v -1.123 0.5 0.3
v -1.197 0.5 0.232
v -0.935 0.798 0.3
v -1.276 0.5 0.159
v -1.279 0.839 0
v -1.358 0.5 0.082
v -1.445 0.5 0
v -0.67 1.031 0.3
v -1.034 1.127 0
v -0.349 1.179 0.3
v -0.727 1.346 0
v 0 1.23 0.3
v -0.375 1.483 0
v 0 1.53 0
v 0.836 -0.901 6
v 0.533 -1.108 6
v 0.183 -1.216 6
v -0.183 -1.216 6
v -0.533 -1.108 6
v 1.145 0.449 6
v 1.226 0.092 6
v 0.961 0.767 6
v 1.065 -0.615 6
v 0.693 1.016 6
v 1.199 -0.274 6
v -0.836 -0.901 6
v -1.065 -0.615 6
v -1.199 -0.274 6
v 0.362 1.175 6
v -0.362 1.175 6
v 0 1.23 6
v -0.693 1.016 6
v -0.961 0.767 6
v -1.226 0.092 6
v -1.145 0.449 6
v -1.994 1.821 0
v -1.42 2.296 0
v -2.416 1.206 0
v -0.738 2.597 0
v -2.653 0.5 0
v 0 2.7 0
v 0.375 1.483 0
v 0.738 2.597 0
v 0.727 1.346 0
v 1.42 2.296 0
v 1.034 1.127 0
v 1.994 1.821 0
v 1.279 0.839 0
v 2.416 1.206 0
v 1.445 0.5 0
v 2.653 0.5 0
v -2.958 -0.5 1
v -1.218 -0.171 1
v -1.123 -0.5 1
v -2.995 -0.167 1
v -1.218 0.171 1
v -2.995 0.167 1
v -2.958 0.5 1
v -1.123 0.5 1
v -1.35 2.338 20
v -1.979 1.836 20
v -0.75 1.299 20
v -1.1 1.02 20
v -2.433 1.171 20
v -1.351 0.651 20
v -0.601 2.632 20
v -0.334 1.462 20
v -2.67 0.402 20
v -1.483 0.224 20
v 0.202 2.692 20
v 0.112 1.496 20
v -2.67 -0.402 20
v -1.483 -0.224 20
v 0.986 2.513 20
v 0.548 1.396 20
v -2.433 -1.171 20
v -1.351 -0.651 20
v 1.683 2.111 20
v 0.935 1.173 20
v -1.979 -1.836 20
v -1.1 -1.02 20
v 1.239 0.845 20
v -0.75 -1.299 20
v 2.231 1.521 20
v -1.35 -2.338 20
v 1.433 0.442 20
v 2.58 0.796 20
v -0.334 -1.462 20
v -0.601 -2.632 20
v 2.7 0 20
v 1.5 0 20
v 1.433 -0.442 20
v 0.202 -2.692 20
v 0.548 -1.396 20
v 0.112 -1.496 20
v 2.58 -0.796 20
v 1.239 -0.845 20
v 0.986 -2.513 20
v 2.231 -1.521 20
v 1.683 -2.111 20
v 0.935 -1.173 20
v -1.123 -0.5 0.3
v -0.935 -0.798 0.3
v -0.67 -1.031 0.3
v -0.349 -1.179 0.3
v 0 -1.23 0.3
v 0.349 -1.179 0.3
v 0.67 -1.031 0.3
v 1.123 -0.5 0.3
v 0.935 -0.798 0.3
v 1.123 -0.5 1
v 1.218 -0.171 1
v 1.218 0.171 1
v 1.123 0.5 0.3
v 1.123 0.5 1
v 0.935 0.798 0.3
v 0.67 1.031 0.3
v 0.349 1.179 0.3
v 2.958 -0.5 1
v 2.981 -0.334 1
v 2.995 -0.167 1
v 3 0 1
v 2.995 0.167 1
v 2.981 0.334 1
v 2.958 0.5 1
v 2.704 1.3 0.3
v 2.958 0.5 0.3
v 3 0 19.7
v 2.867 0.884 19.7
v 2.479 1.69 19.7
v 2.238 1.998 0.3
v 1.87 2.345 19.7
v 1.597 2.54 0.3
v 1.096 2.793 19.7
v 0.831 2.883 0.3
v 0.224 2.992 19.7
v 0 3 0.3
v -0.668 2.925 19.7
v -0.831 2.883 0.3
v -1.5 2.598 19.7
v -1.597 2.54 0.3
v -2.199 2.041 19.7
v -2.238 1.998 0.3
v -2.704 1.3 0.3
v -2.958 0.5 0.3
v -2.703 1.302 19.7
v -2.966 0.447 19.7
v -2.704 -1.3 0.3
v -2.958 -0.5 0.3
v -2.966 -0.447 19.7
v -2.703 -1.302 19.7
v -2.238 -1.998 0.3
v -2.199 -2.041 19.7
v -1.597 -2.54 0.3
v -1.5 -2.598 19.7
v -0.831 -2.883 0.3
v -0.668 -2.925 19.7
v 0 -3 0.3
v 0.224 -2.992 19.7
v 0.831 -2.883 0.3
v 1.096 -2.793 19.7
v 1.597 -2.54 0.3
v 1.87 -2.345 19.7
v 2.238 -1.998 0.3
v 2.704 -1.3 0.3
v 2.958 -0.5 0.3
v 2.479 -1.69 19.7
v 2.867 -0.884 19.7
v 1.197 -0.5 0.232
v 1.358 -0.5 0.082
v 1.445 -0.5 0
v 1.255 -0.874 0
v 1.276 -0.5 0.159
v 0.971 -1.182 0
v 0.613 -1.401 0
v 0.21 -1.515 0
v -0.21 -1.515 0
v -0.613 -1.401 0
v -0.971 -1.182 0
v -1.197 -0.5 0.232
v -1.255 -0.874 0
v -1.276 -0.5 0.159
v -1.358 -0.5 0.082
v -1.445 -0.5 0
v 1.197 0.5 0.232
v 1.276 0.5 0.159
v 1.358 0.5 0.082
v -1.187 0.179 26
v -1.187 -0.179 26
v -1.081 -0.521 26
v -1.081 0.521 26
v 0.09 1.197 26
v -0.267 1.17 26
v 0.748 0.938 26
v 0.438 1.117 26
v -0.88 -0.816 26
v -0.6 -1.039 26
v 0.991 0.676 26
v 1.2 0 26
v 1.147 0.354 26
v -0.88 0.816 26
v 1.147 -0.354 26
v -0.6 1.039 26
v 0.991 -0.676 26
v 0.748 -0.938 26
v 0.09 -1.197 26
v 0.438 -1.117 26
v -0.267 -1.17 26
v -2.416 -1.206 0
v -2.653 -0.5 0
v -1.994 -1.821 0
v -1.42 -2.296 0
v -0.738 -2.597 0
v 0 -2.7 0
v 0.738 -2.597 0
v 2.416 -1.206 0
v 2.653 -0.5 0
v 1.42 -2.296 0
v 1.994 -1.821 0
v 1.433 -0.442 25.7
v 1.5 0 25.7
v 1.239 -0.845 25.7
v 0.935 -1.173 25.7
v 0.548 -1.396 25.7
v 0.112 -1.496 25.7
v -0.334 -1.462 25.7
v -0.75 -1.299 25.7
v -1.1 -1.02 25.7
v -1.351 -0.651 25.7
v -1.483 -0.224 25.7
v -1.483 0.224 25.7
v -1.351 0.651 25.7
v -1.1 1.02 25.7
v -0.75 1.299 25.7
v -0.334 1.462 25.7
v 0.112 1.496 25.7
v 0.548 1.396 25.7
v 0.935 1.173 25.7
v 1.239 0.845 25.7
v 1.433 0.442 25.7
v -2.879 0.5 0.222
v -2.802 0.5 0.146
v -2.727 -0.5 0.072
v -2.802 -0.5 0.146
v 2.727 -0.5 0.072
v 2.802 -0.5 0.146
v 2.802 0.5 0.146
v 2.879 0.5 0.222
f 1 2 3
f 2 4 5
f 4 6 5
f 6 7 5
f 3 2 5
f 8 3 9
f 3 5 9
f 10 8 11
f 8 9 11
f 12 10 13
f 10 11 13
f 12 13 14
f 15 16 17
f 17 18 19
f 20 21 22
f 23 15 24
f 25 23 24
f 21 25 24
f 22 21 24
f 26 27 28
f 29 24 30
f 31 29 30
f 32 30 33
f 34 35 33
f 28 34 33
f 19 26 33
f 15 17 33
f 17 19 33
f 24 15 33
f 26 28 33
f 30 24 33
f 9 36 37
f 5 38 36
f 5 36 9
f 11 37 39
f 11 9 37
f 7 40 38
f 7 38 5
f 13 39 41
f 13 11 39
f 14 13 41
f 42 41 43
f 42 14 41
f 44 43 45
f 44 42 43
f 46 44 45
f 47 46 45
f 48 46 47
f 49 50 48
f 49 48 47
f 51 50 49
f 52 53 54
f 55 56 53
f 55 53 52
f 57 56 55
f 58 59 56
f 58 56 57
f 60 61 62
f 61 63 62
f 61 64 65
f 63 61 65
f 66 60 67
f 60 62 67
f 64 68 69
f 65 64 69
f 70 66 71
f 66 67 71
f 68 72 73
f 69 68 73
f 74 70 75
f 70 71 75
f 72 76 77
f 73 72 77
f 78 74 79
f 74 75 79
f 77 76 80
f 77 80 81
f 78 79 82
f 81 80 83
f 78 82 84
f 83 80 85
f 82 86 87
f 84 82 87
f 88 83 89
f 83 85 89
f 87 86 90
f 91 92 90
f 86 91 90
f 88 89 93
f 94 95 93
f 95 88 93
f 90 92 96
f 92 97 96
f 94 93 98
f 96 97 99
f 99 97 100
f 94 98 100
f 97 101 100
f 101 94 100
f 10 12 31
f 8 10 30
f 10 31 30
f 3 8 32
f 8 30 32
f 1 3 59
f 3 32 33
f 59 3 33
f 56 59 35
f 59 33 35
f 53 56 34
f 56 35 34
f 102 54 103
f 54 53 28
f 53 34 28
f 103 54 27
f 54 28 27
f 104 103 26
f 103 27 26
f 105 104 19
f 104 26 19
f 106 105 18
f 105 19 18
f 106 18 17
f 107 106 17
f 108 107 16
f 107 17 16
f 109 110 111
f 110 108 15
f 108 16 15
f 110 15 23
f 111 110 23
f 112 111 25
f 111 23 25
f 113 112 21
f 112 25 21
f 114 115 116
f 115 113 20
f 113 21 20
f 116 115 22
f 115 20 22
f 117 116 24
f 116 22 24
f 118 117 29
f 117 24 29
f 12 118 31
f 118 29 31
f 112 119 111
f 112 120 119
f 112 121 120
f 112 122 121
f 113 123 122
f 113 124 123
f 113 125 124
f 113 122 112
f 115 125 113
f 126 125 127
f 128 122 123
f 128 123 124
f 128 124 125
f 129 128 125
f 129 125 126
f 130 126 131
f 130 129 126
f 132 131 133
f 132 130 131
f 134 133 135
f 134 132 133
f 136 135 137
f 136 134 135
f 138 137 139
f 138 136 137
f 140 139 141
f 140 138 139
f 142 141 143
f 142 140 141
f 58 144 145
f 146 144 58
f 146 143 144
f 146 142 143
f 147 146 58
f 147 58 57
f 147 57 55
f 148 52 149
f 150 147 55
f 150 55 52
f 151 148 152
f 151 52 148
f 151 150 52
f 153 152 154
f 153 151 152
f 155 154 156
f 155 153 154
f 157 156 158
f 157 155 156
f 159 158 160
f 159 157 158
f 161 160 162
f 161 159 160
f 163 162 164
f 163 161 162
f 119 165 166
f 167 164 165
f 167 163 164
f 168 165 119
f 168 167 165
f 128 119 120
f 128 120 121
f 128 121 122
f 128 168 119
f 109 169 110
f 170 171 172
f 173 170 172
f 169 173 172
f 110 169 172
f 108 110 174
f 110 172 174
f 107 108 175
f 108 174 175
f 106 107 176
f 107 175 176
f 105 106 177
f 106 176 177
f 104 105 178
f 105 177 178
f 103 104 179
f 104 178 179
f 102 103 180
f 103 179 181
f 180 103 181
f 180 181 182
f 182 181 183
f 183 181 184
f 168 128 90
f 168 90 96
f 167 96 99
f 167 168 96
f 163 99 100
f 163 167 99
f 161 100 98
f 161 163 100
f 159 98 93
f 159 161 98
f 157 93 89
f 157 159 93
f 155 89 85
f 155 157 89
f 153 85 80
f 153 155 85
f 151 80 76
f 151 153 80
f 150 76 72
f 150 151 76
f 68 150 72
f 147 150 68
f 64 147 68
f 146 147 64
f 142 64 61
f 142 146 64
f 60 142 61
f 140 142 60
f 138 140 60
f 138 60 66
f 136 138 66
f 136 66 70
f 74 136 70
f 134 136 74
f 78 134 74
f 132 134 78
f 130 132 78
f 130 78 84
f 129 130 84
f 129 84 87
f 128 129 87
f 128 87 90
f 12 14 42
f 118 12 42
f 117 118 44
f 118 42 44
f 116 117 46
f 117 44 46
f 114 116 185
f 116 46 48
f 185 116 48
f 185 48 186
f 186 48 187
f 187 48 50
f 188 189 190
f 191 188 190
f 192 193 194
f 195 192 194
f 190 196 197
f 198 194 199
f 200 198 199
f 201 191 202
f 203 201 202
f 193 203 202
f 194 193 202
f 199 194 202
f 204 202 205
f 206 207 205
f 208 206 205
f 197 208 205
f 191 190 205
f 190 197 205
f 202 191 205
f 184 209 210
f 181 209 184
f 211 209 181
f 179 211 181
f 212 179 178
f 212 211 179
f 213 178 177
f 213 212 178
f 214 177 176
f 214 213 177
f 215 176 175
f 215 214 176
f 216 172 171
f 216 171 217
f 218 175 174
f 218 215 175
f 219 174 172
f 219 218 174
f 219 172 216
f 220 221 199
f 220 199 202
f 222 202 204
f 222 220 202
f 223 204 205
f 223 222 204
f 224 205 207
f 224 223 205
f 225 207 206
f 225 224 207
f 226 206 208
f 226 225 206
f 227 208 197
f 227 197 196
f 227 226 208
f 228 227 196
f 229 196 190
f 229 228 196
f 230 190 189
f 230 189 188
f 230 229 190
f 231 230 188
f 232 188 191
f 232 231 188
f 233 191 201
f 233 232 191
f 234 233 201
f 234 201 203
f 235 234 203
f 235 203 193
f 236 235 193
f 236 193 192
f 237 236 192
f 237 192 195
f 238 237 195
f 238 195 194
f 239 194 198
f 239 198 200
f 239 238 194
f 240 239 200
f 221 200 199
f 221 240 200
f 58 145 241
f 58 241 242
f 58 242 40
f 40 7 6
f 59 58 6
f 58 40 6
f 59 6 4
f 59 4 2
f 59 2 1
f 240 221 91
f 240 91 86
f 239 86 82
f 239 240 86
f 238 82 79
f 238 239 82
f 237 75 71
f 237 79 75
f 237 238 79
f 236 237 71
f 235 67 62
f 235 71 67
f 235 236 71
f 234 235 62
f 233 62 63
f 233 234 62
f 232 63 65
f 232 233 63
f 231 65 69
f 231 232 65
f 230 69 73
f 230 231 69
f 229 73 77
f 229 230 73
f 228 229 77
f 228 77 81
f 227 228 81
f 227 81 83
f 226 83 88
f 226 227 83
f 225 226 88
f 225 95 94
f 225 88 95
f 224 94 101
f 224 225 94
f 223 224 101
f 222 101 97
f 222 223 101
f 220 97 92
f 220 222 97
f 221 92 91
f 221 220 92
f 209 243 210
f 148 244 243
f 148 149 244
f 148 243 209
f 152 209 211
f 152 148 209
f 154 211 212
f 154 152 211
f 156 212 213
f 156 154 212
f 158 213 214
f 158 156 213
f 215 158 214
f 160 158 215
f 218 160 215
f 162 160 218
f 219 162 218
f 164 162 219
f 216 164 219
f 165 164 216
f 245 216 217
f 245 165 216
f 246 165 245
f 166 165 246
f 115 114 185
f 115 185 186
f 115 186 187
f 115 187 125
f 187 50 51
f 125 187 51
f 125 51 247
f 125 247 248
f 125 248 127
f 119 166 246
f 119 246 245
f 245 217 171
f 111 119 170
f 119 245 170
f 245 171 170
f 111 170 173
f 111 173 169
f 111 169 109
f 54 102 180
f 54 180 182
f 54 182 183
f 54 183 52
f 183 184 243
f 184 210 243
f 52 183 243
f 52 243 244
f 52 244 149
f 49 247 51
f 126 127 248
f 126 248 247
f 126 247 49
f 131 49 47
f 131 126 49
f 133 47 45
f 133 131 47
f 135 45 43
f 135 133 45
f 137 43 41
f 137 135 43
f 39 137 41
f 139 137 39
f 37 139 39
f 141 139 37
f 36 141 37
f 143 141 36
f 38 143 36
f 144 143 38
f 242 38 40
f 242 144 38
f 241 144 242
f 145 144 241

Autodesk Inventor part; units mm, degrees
ref_plane "YZ Plane" through (0, 0, 0) normal (1, 0, 0) x (0, 1, 0)
ref_plane "XZ Plane" through (0, 0, 0) normal (0, 1, 0) x (-1, 0, 0)
ref_plane "XY Plane" through (0, 0, 0) normal (0, 0, 1) x (1, 0, 0)
sketch "Sketch1" plane through (0, 0, 0) normal (0, 1, 0) x (-1, 0, 0)
  line L0 (0, 0) -> (-3, 0)
  line L1 (-3, 0) -> (-3, 20)
  line L2 (-3, 20) -> (-1.5, 20)
  line L3 (-1.5, 20) -> (-1.5, 26)
  line L4 (-1.5, 26) -> (0, 26)
  line L5 (0, 26) -> (0, 0)
  dimension "d1" = 6
  dimension "d2" = 20
  dimension "d3" = 3
  dimension "d4" = 6
revolve "Revolution1" add sketch "Sketch1" angle 360 about axis through (0, 0, 26) along (0, 0, -1)
sketch "Sketch2" plane through (0, 0, 0) normal (0, 0, -1) x (-1, 0, 0)
  line L0 (-3, -0.5) -> (3, -0.5)
  line L1 (3, -0.5) -> (3, 0.5)
  line L2 (3, 0.5) -> (-3, 0.5)
  line L3 (-3, 0.5) -> (-3, -0.5)
  line L4 (-3, -0.5) -> (3, 0.5) construction
  line L5 (3, -0.5) -> (-3, 0.5) construction
  circle A0 centre (0, 0) radius 3 projected
  dimension "d6" = 1
extrude "Extrusion1" cut sketch "Sketch2" against normal blind 1 contours L3 A0 L0 | A0 L2 L0 | L3 L2 A0 | A0 L1 L0 | A0 L2 L1
hole "Hole1" at (0, 0, 0) direction (0, 0, 1) diameter 2.459 depth 6 thread size "M3x0.5" class "6H" standard "ANSI Metric M Profile"
thread "Thread1" size "M3x0.5" class "6g" standard "ANSI Metric M Profile" full length
chamfer "Chamfer1" distance 0.3 angle 45 7 edges at (-3, 0, 20) (0, 3, 0) (0, -3, 0) (0, -1.2295, 0) (-0.6697, 1.0311, 0) (0.6697, 1.0311, 0) (-1.5, 0, 26)
properties part number "BRU-320S" material "Stainless Steel AISI 304"
